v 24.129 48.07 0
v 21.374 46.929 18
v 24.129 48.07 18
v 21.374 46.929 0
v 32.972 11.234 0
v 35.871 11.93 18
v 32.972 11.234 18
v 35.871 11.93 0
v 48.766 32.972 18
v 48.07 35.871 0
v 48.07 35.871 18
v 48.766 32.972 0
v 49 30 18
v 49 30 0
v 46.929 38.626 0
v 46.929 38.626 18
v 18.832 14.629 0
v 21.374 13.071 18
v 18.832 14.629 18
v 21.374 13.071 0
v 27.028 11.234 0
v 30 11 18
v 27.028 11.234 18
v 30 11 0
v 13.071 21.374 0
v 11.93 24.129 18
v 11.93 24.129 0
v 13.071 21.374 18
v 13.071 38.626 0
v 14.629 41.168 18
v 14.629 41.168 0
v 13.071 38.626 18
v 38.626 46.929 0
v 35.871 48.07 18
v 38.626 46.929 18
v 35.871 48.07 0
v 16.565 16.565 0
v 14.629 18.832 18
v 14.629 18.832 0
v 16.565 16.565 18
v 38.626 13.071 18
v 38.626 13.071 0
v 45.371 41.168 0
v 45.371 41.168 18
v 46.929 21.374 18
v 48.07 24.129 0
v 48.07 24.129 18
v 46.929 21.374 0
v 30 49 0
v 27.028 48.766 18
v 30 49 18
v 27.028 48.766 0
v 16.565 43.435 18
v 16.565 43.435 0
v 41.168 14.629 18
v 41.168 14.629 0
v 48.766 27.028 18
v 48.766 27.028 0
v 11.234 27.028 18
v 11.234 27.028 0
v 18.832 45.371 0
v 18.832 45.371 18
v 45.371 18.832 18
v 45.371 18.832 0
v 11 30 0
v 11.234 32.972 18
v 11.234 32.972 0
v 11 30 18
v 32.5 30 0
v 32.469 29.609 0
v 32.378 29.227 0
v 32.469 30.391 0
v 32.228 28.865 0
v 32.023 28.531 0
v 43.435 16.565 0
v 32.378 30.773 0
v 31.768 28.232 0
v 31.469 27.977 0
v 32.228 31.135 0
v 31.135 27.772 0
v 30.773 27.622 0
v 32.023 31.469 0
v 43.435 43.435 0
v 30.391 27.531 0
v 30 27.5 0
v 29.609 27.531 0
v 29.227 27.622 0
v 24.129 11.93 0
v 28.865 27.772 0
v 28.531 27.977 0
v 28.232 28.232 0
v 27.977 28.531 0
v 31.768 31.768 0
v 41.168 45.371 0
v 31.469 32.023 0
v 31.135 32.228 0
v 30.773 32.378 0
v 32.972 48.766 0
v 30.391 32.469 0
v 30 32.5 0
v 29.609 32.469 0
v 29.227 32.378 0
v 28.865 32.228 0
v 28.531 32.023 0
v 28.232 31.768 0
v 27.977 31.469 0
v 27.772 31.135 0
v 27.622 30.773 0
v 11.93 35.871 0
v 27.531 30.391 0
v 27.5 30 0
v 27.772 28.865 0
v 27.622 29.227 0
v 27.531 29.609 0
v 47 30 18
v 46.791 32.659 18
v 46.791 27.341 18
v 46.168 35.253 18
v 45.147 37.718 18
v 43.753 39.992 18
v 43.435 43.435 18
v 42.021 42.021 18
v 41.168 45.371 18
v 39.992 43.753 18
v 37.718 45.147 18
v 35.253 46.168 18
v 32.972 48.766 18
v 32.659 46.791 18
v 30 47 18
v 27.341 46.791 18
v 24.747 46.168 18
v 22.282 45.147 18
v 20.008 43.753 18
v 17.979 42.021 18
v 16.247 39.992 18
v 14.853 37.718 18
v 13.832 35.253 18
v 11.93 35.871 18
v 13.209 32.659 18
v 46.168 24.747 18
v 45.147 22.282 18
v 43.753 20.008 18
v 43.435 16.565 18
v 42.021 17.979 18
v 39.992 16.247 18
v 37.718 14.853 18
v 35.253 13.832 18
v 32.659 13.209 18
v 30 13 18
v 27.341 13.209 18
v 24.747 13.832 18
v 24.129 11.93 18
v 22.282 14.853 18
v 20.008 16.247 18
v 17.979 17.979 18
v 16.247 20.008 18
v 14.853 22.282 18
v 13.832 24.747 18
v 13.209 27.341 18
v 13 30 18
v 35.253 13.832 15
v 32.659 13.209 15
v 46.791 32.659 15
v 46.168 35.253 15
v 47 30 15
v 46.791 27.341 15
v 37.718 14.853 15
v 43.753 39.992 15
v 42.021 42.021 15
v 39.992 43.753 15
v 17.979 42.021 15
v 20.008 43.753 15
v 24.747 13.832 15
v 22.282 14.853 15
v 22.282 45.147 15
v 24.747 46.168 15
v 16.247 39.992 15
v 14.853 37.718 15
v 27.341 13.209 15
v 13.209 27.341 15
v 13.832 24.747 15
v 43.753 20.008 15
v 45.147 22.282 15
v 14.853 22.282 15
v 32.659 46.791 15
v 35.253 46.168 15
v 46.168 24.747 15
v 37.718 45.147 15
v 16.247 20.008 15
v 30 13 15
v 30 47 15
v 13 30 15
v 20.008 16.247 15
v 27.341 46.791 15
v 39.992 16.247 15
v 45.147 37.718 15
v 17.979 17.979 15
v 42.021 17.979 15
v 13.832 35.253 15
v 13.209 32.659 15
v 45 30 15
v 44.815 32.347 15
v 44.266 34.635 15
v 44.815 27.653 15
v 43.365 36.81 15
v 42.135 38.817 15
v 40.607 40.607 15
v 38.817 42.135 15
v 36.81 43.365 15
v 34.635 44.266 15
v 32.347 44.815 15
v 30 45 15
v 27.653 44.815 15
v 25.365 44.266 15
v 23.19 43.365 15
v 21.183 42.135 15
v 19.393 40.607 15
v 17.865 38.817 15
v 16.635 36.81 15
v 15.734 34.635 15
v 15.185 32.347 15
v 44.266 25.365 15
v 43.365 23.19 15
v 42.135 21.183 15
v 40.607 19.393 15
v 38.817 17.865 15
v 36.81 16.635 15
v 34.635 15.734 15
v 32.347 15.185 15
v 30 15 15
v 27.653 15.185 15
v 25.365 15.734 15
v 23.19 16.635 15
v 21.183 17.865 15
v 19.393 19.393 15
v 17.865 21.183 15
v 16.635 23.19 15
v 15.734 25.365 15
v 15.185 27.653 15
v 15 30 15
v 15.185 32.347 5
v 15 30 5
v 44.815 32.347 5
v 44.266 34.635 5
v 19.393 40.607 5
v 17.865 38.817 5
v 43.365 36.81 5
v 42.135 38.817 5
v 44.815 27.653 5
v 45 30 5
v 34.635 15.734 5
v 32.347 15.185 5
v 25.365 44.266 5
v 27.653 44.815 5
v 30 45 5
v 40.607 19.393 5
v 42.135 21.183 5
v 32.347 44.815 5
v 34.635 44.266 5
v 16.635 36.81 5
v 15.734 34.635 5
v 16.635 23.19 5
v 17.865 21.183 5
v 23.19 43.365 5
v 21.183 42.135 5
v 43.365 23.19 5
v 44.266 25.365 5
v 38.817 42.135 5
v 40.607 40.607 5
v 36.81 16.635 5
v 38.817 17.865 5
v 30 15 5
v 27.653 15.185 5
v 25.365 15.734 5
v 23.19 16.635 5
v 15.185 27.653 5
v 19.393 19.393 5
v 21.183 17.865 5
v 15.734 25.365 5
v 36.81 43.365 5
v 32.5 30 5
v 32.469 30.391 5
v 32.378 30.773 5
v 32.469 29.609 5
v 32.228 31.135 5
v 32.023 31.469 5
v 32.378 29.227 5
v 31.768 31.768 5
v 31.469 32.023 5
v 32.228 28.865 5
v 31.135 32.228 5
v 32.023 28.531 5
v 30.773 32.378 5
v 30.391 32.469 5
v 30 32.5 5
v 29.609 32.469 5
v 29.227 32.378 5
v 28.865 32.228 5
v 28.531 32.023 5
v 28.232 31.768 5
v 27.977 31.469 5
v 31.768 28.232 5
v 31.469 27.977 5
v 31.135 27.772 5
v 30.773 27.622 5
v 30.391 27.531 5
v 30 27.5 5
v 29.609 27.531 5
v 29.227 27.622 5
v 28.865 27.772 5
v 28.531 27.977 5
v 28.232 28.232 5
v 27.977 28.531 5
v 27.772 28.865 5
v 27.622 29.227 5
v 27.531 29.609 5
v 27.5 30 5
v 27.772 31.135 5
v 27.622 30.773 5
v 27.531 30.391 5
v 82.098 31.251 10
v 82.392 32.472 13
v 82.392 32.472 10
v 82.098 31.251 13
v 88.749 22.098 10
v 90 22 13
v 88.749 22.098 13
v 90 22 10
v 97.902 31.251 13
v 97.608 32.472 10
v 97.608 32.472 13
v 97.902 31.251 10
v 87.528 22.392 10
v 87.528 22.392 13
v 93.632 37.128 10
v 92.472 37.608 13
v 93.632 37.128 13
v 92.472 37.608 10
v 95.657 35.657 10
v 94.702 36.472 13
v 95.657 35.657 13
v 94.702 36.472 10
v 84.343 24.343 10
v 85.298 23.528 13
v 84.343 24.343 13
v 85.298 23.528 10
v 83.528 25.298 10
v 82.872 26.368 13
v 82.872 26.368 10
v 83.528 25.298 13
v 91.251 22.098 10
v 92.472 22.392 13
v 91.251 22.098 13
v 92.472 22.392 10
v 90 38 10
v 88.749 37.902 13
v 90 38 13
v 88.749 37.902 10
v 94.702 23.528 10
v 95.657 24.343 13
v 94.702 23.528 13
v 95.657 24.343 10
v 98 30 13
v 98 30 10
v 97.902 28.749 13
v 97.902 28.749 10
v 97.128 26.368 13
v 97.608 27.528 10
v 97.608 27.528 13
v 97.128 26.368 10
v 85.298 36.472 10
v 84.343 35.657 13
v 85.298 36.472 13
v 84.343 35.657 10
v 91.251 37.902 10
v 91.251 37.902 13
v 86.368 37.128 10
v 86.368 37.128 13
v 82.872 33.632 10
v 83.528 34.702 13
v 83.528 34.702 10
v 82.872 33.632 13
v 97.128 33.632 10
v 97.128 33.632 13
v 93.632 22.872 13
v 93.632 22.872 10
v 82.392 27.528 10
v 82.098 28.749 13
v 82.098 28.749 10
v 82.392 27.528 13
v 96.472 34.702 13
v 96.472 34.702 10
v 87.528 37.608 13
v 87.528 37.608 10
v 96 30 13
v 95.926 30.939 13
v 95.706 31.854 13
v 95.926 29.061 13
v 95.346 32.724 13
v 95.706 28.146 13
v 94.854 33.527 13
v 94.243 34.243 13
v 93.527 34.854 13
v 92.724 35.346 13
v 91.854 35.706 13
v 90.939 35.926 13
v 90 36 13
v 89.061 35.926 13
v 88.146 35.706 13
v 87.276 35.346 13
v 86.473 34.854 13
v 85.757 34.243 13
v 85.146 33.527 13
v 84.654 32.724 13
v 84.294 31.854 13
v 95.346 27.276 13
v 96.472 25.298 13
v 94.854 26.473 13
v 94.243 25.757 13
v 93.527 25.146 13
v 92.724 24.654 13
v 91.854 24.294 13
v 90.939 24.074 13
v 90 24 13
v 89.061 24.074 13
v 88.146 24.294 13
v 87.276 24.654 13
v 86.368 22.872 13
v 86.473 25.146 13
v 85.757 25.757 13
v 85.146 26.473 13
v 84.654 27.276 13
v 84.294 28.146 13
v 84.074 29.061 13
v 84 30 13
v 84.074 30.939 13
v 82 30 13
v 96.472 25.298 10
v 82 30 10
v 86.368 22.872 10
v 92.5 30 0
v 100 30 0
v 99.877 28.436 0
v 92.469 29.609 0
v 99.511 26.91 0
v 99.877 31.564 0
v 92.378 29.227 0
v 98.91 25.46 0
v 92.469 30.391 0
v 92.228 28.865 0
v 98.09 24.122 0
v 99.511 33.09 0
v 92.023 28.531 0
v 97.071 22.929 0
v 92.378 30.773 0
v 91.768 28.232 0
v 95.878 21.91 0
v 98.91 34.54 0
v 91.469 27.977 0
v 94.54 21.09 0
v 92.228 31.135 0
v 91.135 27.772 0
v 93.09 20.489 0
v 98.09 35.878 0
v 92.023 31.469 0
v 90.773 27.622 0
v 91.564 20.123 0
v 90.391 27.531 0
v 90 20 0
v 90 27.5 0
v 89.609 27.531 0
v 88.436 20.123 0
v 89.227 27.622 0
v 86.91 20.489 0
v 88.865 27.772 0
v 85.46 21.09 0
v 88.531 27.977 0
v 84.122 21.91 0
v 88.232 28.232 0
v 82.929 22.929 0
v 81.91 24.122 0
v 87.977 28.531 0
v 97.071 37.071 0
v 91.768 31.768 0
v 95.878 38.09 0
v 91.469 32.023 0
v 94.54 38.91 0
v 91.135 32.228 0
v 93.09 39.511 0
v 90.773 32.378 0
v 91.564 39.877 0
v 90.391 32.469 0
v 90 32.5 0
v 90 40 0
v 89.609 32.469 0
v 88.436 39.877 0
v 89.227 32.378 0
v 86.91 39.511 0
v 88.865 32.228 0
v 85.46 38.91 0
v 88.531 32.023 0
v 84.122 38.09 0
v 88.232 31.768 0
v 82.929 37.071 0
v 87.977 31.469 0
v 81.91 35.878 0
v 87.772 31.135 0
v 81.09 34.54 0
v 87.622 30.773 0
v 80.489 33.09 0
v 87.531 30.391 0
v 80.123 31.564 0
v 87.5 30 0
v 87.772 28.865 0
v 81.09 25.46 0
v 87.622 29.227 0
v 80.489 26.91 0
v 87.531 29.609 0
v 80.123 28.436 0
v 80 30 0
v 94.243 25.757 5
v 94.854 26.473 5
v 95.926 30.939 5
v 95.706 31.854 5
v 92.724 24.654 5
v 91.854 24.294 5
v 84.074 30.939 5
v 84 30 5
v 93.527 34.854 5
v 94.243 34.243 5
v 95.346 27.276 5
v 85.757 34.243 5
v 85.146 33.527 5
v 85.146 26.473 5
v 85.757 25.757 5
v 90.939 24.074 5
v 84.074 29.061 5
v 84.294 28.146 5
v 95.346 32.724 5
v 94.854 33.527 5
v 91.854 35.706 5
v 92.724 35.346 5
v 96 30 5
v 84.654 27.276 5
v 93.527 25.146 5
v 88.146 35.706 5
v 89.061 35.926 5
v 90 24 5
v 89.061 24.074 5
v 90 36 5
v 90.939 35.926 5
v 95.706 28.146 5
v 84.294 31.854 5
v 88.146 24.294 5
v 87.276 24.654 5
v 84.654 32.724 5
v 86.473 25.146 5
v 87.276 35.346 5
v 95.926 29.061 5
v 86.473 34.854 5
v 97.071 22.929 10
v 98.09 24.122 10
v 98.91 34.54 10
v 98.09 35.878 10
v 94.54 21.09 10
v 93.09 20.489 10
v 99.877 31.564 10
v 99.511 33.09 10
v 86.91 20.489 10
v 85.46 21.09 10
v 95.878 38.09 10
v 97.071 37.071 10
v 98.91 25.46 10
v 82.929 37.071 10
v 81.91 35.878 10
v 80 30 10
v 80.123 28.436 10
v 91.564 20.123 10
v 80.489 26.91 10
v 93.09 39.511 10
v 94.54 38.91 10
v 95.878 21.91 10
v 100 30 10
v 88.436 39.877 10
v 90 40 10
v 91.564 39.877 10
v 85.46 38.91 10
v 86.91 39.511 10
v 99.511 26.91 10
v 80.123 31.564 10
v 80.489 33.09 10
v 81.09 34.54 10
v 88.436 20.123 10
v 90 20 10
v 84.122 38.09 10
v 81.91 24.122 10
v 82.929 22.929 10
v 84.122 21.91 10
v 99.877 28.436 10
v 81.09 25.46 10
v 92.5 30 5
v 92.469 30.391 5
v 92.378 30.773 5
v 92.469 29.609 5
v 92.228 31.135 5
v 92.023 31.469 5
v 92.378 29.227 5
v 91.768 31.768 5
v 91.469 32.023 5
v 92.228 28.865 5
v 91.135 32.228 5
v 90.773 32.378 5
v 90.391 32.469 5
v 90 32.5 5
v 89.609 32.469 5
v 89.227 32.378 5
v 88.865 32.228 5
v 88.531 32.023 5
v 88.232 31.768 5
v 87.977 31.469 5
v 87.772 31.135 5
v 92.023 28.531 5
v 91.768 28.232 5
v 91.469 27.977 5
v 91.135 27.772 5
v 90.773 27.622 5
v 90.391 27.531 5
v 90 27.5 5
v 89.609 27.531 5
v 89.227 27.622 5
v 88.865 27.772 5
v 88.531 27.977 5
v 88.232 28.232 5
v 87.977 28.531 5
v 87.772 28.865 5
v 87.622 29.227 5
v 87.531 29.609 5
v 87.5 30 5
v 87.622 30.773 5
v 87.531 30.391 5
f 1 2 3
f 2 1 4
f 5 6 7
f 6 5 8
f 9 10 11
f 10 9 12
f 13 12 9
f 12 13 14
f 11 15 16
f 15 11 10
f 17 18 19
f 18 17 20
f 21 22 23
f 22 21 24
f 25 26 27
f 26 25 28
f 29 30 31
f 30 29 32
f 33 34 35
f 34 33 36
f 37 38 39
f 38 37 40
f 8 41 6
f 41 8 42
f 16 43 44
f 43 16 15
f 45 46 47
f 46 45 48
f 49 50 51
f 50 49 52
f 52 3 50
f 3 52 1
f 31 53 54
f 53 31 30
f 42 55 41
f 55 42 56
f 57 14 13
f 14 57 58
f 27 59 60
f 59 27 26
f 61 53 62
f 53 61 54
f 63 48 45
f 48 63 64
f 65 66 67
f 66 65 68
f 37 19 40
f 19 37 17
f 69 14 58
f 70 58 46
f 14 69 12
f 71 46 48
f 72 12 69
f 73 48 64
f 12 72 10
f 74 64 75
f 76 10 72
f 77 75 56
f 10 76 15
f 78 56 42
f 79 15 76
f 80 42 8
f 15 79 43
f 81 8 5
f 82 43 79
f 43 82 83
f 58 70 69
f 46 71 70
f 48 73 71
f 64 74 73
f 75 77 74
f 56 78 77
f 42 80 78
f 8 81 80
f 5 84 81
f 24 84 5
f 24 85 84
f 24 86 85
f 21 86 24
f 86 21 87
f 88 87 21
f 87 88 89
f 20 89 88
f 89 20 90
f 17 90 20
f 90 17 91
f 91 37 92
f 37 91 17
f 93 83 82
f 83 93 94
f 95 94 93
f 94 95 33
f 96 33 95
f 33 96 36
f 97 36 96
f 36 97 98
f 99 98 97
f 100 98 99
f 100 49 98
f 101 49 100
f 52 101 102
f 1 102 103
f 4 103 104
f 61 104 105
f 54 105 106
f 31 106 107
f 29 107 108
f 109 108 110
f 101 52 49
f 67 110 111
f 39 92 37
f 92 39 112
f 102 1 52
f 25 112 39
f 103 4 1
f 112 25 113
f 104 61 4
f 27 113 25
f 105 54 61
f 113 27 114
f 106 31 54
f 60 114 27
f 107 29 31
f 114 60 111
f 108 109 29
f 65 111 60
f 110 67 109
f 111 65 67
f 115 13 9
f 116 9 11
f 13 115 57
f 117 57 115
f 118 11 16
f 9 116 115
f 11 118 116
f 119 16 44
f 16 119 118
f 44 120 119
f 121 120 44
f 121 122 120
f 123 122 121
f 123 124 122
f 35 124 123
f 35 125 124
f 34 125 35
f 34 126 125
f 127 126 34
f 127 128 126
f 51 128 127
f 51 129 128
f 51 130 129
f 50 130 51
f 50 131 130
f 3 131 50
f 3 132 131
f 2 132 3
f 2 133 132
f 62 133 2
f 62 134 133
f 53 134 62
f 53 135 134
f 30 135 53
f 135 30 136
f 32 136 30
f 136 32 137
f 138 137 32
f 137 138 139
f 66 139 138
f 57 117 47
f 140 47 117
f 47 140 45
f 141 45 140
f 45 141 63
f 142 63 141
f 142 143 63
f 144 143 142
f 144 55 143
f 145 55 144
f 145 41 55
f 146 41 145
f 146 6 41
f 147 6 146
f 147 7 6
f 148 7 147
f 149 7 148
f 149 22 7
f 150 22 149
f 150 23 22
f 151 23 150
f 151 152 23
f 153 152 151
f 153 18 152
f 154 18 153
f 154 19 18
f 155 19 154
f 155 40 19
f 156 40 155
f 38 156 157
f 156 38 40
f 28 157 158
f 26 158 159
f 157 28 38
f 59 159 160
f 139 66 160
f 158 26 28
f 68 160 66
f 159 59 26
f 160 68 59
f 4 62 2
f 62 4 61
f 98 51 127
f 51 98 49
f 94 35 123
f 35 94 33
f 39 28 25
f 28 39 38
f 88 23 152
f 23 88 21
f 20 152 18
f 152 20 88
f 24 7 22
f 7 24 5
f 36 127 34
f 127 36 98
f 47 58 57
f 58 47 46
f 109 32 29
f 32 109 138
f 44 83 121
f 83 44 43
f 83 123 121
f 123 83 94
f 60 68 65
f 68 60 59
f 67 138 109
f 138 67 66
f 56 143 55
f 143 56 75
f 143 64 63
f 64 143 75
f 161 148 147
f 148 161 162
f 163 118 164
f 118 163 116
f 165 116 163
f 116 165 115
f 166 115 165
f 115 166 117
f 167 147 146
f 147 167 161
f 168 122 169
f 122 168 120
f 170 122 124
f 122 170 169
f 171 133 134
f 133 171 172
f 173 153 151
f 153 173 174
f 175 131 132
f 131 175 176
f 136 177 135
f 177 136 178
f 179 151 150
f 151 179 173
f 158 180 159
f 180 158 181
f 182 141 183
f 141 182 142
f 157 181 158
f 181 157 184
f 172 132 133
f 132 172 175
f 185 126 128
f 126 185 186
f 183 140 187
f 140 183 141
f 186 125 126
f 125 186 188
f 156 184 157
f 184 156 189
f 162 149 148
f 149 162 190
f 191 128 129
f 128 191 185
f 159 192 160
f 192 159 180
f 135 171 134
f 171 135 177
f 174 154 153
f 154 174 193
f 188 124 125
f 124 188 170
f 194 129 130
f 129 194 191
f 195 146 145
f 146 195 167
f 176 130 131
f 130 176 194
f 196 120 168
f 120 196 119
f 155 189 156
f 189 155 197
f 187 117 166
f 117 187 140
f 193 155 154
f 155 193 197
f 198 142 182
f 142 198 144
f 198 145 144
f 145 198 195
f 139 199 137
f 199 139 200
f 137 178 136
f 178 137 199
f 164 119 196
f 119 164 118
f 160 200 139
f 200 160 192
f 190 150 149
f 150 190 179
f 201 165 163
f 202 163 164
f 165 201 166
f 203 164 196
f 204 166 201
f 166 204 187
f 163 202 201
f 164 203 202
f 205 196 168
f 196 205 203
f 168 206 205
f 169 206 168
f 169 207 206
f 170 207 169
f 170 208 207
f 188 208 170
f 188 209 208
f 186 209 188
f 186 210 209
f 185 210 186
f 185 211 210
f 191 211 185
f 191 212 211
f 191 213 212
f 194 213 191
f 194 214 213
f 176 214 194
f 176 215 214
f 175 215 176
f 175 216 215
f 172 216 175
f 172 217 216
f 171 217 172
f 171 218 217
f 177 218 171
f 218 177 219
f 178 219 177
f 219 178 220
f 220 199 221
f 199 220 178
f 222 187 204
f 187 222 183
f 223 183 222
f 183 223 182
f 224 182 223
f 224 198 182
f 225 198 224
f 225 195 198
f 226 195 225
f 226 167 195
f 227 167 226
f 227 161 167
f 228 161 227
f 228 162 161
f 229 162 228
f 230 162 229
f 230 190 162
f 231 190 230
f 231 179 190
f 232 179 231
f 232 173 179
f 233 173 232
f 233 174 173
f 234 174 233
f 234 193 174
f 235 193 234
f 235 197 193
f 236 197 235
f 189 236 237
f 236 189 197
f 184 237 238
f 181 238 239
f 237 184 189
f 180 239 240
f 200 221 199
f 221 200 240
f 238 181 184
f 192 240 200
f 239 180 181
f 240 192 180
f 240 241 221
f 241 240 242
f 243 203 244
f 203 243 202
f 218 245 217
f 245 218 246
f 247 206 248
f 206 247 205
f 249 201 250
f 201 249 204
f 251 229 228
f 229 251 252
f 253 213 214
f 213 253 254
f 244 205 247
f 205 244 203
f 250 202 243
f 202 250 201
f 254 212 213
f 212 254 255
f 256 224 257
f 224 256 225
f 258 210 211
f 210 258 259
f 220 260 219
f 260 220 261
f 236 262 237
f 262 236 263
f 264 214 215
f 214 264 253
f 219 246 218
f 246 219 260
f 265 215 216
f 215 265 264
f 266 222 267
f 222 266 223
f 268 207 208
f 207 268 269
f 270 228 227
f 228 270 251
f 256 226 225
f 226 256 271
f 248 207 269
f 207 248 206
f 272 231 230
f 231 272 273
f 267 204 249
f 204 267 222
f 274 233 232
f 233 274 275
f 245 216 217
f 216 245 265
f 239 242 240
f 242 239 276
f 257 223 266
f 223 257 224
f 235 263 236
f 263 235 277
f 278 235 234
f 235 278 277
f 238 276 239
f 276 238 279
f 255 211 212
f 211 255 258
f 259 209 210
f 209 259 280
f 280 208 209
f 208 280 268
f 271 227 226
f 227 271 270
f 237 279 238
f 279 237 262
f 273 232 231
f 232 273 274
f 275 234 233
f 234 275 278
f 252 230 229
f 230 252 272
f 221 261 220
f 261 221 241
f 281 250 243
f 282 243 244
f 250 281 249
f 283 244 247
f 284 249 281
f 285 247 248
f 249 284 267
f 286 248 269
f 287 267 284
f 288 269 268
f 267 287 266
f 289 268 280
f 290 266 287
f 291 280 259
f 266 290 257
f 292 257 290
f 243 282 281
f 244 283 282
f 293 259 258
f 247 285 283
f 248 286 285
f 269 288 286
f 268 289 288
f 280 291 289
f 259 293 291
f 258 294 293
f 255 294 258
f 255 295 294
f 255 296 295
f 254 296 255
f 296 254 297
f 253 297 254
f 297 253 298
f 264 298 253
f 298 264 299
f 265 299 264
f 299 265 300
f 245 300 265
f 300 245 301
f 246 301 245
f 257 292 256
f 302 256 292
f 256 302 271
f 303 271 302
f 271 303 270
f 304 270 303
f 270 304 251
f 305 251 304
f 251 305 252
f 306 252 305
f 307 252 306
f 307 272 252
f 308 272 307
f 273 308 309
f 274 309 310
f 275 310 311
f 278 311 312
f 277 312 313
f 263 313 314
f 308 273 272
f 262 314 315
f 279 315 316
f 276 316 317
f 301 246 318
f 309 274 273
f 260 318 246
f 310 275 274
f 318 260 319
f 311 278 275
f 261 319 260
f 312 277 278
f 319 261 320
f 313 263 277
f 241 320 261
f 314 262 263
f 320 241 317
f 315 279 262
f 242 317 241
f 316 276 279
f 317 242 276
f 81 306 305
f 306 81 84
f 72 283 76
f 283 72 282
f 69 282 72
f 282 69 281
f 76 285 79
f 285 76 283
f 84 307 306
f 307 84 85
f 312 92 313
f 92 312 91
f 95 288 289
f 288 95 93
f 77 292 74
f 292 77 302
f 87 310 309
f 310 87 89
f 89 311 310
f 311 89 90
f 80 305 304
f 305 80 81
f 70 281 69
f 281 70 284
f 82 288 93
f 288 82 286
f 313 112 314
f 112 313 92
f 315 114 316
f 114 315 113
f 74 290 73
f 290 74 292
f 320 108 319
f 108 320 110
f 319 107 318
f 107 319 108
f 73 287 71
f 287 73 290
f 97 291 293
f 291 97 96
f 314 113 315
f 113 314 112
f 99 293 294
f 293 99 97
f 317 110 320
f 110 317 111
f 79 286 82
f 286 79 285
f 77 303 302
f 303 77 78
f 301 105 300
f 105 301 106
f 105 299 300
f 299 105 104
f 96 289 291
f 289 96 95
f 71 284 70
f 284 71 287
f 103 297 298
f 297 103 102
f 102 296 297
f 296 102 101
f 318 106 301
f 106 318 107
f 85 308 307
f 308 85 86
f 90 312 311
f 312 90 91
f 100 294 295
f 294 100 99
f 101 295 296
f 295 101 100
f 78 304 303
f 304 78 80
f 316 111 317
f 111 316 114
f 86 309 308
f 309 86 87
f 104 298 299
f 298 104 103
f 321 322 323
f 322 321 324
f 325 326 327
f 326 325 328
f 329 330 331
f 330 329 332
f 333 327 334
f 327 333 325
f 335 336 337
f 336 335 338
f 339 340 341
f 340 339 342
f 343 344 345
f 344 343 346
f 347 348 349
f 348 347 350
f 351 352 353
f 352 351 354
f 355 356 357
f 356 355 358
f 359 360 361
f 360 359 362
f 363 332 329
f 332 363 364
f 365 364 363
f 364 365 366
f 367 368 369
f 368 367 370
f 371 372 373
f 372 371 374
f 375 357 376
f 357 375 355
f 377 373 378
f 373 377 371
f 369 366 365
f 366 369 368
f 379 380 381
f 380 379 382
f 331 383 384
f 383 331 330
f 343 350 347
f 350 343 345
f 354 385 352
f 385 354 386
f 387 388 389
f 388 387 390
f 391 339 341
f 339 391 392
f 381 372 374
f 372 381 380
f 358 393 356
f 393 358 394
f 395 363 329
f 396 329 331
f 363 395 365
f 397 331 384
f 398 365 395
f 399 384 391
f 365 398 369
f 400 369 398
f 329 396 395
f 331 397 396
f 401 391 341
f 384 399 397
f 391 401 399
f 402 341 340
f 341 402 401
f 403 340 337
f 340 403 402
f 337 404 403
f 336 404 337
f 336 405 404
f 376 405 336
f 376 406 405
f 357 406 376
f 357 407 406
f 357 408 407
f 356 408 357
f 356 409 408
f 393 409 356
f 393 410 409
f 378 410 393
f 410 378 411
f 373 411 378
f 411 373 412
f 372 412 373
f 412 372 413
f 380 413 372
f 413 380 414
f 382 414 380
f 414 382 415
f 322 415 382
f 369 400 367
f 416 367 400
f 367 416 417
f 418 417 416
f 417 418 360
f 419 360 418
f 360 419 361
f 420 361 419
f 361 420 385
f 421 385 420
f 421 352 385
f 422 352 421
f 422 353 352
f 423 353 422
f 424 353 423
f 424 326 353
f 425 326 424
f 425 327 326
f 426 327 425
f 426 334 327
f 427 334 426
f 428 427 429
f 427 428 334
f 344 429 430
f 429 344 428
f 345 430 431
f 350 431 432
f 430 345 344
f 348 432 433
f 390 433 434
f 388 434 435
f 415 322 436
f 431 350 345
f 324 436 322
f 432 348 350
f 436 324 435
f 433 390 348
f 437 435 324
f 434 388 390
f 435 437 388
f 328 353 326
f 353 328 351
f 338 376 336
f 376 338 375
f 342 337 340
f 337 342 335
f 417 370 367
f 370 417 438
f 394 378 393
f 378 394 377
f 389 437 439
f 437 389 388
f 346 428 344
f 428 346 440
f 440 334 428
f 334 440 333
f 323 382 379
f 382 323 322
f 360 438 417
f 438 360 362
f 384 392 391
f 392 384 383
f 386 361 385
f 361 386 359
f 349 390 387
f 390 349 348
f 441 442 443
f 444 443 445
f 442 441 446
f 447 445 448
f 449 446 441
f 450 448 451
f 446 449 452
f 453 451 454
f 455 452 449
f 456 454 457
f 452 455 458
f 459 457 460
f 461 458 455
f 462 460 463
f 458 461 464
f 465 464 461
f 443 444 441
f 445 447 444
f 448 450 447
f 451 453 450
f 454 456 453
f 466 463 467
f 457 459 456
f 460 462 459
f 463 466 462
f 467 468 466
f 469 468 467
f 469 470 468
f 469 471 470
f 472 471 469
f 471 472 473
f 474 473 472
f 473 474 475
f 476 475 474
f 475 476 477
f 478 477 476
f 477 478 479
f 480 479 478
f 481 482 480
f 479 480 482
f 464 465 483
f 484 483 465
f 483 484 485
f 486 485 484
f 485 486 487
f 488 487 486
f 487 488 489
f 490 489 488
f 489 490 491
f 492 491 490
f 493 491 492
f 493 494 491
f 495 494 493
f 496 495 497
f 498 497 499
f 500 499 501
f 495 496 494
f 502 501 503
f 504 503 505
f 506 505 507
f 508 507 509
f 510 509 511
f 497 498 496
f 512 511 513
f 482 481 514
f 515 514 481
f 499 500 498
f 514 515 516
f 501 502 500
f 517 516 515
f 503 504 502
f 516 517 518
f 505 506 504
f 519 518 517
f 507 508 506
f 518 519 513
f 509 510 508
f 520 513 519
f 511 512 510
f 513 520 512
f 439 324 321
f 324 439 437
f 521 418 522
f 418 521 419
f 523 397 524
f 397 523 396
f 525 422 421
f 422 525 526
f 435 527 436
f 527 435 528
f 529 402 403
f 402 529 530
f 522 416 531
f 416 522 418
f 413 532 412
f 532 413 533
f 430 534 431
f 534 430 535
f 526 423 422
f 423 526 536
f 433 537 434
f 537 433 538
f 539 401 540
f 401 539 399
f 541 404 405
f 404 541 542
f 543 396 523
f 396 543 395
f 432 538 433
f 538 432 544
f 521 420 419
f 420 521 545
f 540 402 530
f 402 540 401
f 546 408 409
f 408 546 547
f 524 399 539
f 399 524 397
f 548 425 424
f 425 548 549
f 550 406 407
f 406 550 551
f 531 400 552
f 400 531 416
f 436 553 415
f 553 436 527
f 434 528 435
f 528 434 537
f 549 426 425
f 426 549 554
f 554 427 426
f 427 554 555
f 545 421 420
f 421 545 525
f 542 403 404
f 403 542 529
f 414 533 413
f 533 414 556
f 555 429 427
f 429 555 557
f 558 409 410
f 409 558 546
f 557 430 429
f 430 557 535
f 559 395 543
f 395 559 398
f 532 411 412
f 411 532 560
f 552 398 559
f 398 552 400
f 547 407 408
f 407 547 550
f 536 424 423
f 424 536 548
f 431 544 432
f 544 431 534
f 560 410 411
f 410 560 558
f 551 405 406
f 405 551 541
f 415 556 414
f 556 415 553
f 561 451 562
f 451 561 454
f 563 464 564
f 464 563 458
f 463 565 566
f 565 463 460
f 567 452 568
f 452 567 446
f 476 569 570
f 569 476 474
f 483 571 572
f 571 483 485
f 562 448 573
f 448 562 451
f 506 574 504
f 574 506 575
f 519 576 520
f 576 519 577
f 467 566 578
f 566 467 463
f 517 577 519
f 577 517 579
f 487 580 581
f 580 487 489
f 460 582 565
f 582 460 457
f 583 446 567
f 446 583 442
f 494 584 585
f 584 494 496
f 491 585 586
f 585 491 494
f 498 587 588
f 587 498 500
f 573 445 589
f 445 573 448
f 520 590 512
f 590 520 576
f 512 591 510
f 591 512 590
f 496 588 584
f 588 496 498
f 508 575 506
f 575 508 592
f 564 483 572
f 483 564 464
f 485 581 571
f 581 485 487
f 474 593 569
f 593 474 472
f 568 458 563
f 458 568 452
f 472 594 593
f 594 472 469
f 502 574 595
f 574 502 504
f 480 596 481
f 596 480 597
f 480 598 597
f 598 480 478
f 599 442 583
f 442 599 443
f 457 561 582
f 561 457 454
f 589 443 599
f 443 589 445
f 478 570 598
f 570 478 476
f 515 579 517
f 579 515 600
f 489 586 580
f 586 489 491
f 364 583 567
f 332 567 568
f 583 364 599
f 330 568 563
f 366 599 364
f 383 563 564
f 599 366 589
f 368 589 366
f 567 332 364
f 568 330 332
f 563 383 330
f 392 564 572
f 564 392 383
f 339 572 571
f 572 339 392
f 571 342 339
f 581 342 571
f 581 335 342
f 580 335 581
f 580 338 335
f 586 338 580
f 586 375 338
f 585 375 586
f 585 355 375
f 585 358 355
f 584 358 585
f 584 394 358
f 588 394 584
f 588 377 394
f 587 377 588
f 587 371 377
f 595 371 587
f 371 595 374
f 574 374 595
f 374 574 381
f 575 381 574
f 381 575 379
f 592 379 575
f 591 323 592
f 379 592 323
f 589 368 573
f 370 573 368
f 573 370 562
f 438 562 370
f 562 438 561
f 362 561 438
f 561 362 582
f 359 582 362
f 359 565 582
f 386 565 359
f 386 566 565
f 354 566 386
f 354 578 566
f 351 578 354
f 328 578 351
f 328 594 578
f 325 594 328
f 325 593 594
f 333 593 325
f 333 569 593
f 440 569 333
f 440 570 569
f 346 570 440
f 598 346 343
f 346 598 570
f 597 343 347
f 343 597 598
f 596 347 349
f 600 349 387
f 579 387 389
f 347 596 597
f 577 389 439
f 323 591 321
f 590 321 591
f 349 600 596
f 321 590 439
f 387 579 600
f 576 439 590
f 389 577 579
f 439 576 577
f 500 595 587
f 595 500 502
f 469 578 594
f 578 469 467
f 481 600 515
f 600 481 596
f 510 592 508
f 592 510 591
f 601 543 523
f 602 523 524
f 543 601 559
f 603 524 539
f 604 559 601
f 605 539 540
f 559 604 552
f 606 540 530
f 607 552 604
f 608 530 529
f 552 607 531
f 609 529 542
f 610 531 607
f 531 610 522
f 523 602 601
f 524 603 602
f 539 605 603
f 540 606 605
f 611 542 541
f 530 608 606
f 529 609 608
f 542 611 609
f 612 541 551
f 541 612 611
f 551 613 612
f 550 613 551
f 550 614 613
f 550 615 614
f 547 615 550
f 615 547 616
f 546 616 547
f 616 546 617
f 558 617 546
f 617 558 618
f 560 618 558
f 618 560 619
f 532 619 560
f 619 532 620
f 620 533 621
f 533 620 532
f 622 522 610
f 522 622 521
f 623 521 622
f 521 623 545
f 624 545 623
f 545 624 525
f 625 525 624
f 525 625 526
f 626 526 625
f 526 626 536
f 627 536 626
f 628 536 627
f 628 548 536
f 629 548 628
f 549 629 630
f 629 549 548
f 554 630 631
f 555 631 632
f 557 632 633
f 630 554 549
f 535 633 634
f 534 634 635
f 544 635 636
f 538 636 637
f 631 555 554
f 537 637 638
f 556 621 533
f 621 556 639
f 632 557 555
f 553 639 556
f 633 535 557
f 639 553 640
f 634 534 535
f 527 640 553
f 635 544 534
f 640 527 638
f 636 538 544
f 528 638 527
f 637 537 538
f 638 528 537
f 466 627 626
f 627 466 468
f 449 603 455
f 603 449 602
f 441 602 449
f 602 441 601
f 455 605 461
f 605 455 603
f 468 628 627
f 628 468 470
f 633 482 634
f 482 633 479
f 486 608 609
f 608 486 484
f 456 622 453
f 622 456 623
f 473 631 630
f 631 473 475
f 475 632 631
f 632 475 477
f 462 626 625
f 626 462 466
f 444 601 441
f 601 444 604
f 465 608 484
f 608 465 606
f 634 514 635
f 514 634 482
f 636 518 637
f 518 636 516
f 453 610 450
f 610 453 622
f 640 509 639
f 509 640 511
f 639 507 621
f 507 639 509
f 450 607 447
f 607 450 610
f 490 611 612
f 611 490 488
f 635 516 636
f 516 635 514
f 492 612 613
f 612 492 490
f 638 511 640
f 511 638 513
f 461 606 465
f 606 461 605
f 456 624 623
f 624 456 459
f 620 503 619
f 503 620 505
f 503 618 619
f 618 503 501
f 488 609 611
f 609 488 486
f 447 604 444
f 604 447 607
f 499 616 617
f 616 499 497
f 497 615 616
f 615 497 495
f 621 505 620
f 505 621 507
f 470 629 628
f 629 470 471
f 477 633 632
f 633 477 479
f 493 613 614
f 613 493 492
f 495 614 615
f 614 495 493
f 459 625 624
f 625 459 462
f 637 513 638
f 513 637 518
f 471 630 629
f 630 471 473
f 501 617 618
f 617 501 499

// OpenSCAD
$fn = 40; // 360 is smooth

espesor = 5; //espesor buscado de la rueda (radio ext- radio int)
Dext = 30; //diametro exterior de la rueda
Ancho = 10; //ancho de la rueda
Dtornillo=5; //diametro de tornillo

difference() {
  union() {
    // pieza base contenedora
    difference() {
      // base y paredes del molde
      union () {
        //translate([30, 30, 0]) color("pink")    cylinder(h=25, r=30);

		translate([30, 30, 0]) color("pink")    cylinder(h=(Ancho+5), r=(Dext/2+4));        

		// paredcita exterior
        difference () {
          translate([30, 30, 0]) color("pink")    cylinder(h=(Ancho+8), r=(Dext/2+4));
          translate([30, 30, 0]) color("SkyBlue") cylinder(h=(Ancho+9), r=(Dext/2+2));
        }
      }
      // espacio para la cubierta
      translate([30, 30, 5]) color("SkyBlue") cylinder(h=(Ancho+5), r=(Dext/2+0));
      // tornillo central
      translate([30, 30, 0]) color("SkyBlue") cylinder(h=(Ancho+5), r=(Dtornillo/2));
    }

    // pieza móvil del centro
    translate([(Dext*2), 0, -5]) // esto saca la pieza de adentro de la otra
    difference() {
      // pieza central para determinar el ancho de la rueda
      union () {
        translate([30, 30, 5])  color("pink")    cylinder(h=Ancho, r=(Dext/2-espesor));
        // paredcita interior
        difference () {
          translate([30, 30, 5]) color("pink")    cylinder(h=(Ancho+3), r=(Dext/2-espesor-2));
          translate([30, 30, 5]) color("SkyBlue") cylinder(h=(Ancho+3), r=(Dext/2-espesor-4));
        }
      }
      // hueco adicional para no requerir un tornillo muy largo
      translate([30, 30, 10]) color("SkyBlue") cylinder(h=Ancho, r=(Dext/2-espesor-4));
      // tornillo central
      translate([30, 30, 5])  color("SkyBlue") cylinder(h=Ancho, r=(Dtornillo/2));
    }
  }
  // corte transversal
  //color("LightYellow") cube([150, 30, 50]);
}
